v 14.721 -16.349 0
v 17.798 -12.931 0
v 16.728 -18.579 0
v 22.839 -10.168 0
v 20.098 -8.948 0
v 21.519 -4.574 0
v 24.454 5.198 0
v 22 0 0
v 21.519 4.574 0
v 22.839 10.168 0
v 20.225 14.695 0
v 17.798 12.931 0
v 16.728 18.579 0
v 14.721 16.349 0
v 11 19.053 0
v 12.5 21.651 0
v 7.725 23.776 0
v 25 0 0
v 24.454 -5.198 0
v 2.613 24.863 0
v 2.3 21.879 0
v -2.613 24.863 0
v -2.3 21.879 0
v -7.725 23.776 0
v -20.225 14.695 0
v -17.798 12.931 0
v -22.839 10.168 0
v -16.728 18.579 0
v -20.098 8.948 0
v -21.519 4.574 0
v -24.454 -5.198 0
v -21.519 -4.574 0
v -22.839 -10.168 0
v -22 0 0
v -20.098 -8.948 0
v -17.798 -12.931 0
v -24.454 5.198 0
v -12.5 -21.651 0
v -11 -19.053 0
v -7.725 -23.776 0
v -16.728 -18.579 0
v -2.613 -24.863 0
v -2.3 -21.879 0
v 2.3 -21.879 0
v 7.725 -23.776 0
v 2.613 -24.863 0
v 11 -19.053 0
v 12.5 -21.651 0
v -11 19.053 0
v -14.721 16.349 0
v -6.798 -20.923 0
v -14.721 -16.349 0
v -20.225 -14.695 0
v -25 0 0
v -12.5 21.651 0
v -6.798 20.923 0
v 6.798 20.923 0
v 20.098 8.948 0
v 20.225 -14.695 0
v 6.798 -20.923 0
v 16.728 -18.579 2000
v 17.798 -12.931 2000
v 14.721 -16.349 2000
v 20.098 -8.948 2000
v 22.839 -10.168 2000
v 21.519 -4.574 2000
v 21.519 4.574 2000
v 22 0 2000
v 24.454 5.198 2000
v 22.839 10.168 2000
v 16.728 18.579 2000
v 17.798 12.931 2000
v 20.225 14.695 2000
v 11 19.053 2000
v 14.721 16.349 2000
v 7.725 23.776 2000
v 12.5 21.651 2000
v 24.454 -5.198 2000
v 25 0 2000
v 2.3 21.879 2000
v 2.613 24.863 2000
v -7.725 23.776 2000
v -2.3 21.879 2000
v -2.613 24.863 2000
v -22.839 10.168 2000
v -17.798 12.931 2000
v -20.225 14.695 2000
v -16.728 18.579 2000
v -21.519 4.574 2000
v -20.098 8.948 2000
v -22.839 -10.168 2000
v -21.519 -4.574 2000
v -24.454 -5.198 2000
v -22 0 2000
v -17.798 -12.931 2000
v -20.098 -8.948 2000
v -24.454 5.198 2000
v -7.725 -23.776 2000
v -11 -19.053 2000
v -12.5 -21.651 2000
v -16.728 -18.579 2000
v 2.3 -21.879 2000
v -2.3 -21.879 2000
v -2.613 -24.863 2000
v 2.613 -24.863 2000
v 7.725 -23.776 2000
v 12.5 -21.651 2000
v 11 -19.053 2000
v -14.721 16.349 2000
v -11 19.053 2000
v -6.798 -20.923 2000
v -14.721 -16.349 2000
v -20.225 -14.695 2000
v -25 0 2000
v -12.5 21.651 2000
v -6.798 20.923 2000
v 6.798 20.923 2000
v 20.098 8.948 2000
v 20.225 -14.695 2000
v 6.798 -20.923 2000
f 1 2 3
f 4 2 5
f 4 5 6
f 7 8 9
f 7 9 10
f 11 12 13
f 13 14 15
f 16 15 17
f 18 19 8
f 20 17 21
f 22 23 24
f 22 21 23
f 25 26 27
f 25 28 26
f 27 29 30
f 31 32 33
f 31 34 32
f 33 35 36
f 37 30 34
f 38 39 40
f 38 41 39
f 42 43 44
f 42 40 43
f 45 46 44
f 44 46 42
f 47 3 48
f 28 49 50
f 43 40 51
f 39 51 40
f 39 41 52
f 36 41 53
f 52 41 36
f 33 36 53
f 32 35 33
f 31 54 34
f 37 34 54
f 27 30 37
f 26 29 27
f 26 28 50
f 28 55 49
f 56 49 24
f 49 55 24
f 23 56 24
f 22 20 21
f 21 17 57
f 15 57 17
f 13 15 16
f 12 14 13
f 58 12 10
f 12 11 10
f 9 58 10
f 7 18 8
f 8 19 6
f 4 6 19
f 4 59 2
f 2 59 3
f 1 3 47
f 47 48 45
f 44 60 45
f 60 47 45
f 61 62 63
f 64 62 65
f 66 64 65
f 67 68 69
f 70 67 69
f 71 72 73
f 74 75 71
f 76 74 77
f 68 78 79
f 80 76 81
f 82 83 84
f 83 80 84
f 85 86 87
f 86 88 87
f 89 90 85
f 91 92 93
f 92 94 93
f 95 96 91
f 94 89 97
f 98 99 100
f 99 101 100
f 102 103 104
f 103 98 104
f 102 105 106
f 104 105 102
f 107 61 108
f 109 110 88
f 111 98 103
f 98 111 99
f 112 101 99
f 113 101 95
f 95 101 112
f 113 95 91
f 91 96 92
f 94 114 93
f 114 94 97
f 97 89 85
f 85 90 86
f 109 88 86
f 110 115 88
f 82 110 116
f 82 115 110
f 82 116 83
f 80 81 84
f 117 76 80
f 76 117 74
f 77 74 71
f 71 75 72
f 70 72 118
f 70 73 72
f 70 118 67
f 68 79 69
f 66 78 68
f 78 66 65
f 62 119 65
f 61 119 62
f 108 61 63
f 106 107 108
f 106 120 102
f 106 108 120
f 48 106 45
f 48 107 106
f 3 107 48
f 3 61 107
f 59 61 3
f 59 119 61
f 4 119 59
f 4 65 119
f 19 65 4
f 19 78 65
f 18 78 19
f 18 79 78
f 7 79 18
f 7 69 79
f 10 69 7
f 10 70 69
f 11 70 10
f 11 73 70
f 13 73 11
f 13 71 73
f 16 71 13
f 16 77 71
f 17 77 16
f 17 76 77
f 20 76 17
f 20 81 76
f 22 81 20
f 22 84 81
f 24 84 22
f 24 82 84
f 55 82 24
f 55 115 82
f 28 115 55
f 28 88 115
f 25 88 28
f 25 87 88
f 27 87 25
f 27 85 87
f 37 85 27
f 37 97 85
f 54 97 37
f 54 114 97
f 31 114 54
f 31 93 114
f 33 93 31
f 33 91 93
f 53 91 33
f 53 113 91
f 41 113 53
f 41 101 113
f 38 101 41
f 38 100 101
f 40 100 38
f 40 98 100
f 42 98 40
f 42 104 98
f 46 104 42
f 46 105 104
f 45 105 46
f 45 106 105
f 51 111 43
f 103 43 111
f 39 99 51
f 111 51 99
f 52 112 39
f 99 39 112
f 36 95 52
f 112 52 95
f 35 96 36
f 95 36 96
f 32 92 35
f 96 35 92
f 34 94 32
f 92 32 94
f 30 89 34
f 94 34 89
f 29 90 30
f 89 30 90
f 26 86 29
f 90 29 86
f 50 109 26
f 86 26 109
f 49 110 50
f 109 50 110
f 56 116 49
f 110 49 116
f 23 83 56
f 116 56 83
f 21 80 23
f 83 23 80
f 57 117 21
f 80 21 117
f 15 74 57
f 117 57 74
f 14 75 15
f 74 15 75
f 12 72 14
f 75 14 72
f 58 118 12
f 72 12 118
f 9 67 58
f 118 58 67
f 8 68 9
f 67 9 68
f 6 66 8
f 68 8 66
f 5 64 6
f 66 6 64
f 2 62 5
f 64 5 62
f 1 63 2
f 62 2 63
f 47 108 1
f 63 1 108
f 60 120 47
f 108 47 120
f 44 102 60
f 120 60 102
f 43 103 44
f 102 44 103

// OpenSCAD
/*
round pipe
 diameter = a
 material_thickness = b
*/

module simple_profile_RP(a,b, length) {
    echo(material="<b>round pipe</b>", a, b, length);
    radius = a/2;
    linear_extrude( height = length ) {
        difference() {
            circle(r=radius, center=true);
            circle(r=radius-b, center=true);
        };
    }
}

simple_profile_RP(50,3, 2000);
